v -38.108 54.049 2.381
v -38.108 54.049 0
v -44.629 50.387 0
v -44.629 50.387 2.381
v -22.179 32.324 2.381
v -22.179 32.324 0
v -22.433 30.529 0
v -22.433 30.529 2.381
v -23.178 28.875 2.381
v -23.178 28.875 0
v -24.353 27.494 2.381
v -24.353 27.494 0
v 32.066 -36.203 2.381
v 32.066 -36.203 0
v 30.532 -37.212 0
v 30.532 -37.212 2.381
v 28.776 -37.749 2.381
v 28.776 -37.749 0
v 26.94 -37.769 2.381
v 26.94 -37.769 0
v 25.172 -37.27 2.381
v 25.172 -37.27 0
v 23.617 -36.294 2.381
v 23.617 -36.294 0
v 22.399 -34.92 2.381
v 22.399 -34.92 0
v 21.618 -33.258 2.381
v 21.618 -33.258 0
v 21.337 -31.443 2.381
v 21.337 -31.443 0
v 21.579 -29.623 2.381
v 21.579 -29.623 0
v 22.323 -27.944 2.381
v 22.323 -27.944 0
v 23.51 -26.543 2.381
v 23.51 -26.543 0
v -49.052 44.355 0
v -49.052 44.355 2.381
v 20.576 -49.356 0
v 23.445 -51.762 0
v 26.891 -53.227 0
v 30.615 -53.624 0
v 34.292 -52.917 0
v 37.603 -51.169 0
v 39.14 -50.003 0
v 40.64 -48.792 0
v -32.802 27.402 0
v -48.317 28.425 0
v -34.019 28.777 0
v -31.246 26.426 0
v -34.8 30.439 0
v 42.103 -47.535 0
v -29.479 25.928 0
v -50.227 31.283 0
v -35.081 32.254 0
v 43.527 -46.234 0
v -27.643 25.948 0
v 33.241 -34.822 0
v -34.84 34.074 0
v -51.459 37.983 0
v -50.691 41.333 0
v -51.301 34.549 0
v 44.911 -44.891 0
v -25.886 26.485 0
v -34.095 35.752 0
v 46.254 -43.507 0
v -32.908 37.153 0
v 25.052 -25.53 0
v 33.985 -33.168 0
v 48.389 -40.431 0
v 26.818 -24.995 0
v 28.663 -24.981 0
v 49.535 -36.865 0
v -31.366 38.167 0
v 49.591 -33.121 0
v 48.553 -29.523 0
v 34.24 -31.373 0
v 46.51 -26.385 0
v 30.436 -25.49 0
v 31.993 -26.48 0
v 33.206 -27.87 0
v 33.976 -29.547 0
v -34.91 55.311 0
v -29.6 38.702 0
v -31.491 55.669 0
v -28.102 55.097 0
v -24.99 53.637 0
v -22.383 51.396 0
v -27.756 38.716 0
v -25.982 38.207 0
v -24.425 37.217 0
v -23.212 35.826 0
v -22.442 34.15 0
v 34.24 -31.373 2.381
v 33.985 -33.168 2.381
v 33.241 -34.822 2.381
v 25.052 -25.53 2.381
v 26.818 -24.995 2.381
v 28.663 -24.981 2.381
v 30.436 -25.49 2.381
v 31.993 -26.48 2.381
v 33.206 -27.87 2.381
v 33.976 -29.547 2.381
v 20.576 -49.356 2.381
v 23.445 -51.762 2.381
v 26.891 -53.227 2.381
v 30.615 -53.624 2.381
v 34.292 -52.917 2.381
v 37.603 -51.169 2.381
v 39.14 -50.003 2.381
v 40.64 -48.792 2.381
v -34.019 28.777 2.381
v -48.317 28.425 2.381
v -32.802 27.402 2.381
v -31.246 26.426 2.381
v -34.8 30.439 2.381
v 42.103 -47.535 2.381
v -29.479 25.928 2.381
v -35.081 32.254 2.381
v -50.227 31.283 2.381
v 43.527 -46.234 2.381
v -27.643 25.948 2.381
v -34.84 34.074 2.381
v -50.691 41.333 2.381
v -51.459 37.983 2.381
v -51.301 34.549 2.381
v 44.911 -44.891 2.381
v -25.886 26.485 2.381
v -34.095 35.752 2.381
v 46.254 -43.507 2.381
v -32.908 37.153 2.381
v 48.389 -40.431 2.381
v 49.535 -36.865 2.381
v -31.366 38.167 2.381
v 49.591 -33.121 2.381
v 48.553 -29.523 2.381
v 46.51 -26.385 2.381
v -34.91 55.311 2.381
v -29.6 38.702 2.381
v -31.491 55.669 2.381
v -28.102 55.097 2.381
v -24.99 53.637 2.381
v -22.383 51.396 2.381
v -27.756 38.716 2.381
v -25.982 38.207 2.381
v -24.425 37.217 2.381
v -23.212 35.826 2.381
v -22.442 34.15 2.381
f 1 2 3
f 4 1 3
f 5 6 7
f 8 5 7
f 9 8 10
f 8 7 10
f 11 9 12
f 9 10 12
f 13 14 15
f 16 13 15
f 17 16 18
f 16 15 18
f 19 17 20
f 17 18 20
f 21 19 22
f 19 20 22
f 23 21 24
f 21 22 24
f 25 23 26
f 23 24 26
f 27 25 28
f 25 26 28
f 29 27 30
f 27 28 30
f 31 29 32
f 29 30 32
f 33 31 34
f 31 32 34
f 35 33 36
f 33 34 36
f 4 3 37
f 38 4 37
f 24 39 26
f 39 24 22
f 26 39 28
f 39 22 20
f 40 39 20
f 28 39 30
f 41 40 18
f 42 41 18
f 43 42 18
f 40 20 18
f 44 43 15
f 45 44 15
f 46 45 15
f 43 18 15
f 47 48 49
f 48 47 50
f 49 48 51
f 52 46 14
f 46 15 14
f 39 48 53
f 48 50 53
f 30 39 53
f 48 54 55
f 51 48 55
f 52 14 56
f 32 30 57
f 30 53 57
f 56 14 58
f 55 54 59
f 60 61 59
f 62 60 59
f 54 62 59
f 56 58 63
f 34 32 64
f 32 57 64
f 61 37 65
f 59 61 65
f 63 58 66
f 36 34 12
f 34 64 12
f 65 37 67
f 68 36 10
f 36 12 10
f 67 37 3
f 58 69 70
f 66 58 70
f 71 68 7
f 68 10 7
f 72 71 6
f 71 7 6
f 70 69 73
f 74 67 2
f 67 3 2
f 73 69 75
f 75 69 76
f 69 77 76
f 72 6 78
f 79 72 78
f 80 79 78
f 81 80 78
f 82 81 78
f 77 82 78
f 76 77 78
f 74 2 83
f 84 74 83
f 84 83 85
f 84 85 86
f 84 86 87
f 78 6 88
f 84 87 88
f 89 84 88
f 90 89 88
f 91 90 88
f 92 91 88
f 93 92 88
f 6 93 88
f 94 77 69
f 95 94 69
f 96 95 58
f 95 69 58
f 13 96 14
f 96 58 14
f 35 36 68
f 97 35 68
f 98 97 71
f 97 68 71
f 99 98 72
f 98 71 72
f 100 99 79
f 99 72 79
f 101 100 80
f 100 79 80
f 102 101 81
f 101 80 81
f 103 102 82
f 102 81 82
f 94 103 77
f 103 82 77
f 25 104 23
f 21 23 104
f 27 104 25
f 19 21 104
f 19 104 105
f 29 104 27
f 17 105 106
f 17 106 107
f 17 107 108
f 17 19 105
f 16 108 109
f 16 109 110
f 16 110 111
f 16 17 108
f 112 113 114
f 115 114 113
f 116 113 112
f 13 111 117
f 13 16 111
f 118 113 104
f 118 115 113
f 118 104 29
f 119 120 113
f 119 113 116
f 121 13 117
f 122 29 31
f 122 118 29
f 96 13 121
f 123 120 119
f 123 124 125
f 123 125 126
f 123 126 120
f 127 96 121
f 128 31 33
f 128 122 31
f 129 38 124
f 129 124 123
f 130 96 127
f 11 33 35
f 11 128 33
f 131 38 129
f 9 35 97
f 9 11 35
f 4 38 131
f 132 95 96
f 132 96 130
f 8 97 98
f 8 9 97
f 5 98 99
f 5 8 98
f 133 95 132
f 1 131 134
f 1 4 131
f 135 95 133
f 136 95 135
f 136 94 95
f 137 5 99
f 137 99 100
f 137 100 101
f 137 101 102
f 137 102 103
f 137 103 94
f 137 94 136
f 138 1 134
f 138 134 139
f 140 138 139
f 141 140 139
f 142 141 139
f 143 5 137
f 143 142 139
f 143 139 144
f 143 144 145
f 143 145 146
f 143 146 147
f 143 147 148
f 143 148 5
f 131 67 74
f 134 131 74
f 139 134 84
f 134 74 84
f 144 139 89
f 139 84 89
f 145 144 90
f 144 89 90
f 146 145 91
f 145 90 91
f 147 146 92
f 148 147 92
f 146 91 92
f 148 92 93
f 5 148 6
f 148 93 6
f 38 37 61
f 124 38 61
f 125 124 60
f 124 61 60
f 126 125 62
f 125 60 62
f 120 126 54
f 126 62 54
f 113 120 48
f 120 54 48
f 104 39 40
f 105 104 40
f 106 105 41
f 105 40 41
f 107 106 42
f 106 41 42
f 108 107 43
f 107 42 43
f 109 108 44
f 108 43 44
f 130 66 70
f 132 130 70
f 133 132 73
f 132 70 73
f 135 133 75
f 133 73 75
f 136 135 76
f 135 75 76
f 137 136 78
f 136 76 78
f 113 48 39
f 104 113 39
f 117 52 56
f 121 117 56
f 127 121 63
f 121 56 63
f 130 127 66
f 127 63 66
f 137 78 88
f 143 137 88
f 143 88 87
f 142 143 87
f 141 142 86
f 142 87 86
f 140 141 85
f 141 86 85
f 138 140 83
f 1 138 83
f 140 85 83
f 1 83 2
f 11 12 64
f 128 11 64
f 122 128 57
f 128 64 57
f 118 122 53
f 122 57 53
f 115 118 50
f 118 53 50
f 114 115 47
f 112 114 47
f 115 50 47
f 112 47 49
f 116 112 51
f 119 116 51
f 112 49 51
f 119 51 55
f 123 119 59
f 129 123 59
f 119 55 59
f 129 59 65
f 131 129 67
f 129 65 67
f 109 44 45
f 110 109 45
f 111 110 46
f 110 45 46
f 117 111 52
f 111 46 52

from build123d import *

# Parameters (mm, degrees)
F1_DEPTH = 2.38125


# Not quite as in the source:
# - a feature names something its author has since deleted; it is built from what else it names


with BuildPart() as f1:
    # F0 (on Top) → F1 (new body)
    with BuildSketch(Plane.XY):
        with BuildLine():
            Line((0.0148852749, -0.0168055587), (-12.9522491515, -11.5022529852))
            Line((-12.9522491515, -11.5022529852), (20.5757791682, -49.3555846081))
            ThreePointArc((20.5757791682, -49.3555846081), (28.7380799657, -53.5635383735), (37.6034379496, -51.168656953))
            ThreePointArc((37.6034379496, -51.168656953), (39.8947610083, -49.4030165485), (42.1032952287, -47.5348559574))
            Line((42.1032952287, -47.5348559574), (32.0658696462, -36.2025462971))
            ThreePointArc((32.0658696462, -36.2025462971), (22.9586334857, -35.6506997271), (23.5104800557, -26.5434635666))
            Line((23.5104800557, -26.5434635666), (0.0148852749, -0.0168055587))
        make_face()
        with BuildLine():
            Line((12.9820197013, 11.4686418678), (0.0148852749, -0.0168055587))
            Line((0.0148852749, -0.0168055587), (23.5104800557, -26.5434635666))
            ThreePointArc((23.5104800557, -26.5434635666), (30.4363031351, -25.4899309777), (34.2397748509, -31.3730049319))
            ThreePointArc((34.2397748509, -31.3730049319), (33.6712488051, -34.0211332161), (32.0658696462, -36.2025462971))
            Line((32.0658696462, -36.2025462971), (42.1032952287, -47.5348559574))
            ThreePointArc((42.1032952287, -47.5348559574), (44.2244575032, -45.5680519503), (46.2538460369, -43.5066860011))
            ThreePointArc((46.2538460369, -43.5066860011), (49.7016552964, -34.9953617498), (46.510048021, -26.3846897551))
            Line((46.510048021, -26.3846897551), (12.9820197013, 11.4686418678))
        make_face()
        with BuildLine():
            Line((-48.3172110137, 28.4249868882), (-12.9522491515, -11.5022529852))
            Line((-12.9522491515, -11.5022529852), (0.0148852749, -0.0168055587))
            Line((0.0148852749, -0.0168055587), (0, 0))
            Line((0, 0), (-24.3525459603, 27.4941606857))
            ThreePointArc((-24.3525459603, 27.4941606857), (-33.4597821208, 28.0460072558), (-32.9079355507, 37.1532434163))
            Line((-32.9079355507, 37.1532434163), (-44.6294929424, 50.3869473148))
            Line((-44.6294929424, 50.3869473148), (-49.0520937641, 44.3552682835))
            ThreePointArc((-49.0520937641, 44.3552682835), (-51.4967480049, 36.2604022841), (-48.3172110137, 28.4249868882))
        make_face()
        with BuildLine():
            Line((0, 0), (0.0148852749, -0.0168055587))
            Line((0.0148852749, -0.0168055587), (12.9820197013, 11.4686418678))
            Line((12.9820197013, 11.4686418678), (-22.3829421609, 51.3958817412))
            ThreePointArc((-22.3829421609, 51.3958817412), (-29.7771159339, 55.4982449772), (-38.1079364614, 54.0488936593))
            Line((-38.1079364614, 54.0488936593), (-44.6294929424, 50.3869473148))
            Line((-44.6294929424, 50.3869473148), (-32.9079355507, 37.1532434163))
            ThreePointArc((-32.9079355507, 37.1532434163), (-25.9821124713, 38.2067760052), (-22.1786407555, 32.323702051))
            ThreePointArc((-22.1786407555, 32.323702051), (-22.7471668013, 29.6755737668), (-24.3525459603, 27.4941606857))
            Line((-24.3525459603, 27.4941606857), (0, 0))
        make_face()
    extrude(amount=F1_DEPTH)


solid = f1.part
